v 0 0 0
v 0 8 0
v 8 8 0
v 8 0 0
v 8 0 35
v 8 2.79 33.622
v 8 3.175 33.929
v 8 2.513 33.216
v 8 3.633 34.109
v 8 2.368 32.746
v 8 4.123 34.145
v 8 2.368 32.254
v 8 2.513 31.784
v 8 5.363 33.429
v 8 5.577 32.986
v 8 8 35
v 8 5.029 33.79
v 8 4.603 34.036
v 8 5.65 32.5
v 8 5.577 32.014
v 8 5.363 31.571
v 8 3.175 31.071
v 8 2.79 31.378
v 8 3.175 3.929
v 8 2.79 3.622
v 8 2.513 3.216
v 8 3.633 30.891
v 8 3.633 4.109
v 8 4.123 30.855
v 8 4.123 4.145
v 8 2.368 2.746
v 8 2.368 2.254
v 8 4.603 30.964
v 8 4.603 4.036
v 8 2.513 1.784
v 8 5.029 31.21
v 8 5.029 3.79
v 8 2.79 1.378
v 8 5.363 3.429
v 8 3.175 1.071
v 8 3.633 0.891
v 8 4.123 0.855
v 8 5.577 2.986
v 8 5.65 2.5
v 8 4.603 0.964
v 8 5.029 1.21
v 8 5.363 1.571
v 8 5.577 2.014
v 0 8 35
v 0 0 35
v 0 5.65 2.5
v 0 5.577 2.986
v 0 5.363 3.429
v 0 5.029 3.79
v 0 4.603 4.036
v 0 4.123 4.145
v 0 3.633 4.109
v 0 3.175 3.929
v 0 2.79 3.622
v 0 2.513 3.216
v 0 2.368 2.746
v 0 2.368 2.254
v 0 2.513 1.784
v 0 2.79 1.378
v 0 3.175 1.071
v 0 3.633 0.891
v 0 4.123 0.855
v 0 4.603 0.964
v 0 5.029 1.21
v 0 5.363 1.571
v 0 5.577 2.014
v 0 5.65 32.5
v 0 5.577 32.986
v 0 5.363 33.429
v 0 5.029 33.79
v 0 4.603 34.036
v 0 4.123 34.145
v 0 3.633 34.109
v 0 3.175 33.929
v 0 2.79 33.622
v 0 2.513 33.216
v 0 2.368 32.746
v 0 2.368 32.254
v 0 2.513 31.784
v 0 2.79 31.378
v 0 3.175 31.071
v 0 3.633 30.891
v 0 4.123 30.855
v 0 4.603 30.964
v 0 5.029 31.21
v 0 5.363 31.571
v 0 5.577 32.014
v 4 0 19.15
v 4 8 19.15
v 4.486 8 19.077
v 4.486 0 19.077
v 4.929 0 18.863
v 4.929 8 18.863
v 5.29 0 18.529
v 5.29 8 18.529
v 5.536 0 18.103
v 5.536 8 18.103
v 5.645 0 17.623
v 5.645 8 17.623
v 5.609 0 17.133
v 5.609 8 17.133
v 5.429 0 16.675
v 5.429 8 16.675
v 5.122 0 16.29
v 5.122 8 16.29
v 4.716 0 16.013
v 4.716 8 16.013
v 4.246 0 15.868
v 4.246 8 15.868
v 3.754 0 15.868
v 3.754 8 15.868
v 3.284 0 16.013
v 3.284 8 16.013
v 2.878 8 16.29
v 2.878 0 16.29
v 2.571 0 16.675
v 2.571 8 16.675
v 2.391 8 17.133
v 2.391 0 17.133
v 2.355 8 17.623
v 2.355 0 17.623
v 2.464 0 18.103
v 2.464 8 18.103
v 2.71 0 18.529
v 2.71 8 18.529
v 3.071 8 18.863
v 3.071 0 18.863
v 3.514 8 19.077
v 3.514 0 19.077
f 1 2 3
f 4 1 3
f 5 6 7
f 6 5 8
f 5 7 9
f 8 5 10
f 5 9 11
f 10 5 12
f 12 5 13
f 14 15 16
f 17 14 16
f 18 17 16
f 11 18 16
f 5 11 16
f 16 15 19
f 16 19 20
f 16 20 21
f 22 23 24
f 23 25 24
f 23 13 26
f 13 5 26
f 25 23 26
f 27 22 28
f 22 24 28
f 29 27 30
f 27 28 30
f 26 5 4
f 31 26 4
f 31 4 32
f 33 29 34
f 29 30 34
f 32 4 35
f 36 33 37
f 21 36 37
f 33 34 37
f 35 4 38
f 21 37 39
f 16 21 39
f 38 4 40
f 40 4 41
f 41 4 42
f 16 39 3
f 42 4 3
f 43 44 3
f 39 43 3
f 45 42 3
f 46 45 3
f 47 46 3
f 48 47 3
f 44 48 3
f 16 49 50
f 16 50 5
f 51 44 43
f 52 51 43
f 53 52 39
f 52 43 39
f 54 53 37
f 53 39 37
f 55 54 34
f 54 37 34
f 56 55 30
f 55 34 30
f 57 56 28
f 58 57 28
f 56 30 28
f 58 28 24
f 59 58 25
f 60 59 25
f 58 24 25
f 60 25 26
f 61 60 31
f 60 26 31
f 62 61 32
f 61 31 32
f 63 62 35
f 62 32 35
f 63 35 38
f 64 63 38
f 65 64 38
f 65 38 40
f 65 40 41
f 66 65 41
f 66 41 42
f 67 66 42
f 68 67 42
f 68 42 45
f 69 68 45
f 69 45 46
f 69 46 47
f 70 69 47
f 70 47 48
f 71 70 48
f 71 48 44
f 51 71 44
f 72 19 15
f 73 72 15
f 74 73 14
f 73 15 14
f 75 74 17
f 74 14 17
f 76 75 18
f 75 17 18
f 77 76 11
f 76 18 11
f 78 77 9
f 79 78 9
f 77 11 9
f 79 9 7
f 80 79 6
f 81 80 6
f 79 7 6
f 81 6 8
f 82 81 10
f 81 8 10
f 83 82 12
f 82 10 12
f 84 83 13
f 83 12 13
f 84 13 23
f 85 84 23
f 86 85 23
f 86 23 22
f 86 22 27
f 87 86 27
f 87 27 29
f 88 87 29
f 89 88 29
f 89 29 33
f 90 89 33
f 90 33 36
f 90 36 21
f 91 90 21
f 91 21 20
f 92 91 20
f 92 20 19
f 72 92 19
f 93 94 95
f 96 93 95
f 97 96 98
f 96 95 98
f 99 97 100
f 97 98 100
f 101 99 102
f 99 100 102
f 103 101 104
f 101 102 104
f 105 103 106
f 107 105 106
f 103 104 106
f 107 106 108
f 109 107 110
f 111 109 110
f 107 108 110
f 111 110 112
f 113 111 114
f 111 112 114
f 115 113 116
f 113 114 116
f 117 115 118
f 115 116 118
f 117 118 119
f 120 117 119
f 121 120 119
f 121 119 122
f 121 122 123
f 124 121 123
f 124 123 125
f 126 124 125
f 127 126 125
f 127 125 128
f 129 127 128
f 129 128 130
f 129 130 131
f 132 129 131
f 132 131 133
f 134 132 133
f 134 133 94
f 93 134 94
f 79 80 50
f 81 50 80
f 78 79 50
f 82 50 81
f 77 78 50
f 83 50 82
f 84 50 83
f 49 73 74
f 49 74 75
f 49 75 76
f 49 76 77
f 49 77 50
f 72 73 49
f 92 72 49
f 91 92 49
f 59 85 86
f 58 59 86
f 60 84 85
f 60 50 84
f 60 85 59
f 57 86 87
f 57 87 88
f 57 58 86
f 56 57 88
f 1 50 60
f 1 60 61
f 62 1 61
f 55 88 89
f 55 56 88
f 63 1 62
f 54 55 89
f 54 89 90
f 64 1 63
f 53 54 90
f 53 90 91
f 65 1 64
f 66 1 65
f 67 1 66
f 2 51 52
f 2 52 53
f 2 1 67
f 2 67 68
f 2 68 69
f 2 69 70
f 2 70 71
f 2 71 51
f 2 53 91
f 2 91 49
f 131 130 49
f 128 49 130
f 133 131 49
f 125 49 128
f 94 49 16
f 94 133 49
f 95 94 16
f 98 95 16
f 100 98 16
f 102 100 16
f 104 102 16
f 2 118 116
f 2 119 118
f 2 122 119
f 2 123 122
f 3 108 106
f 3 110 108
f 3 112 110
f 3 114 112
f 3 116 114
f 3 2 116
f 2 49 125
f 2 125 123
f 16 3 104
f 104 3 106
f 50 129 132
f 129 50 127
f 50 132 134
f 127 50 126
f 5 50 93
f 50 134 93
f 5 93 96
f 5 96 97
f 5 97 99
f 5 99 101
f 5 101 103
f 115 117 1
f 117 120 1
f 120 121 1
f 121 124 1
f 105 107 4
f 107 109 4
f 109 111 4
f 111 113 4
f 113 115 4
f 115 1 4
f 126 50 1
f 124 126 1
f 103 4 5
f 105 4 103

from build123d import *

# Parameters (mm, degrees)
SKETCH_1_W          = 8
SKETCH_1_H          = 8
EXTRUDE_1_DEPTH     = 35
SKETCH_2_R          = 1.65
CUT_EXTRUDE_1_DEPTH = 40
SKETCH_3_R          = 1.65
CUT_EXTRUDE_2_DEPTH = 40


with BuildPart() as part:
    # 草图1 → 凸台-拉伸1 (new body)
    with BuildSketch(Plane.XY):
        with Locations((4, 4)):
            Rectangle(SKETCH_1_W, SKETCH_1_H)
    extrude(amount=EXTRUDE_1_DEPTH)

    # 草图2 → 切除-拉伸1 (cut)
    with BuildSketch(Plane(origin=(8, 0, 0), x_dir=(0, 0, -1), z_dir=(1, 0, 0))):
        with Locations(Location((-32.5, 4, 0), (0, 0, 90))):
            Circle(SKETCH_2_R)
        with Locations(Location((-2.5, 4, 0), (0, 0, 90))):
            Circle(SKETCH_2_R)
    extrude(amount=-CUT_EXTRUDE_1_DEPTH, mode=Mode.SUBTRACT)

    # 草图3 → 切除-拉伸2 (cut)
    with BuildSketch(Plane(origin=(0, 8, 0), x_dir=(1, 0, 0), z_dir=(0, 1, 0))):
        with Locations(Location((4, -17.5, 0), (0, 0, 270))):
            Circle(SKETCH_3_R)
    extrude(amount=-CUT_EXTRUDE_2_DEPTH, mode=Mode.SUBTRACT)


solid = part.part
